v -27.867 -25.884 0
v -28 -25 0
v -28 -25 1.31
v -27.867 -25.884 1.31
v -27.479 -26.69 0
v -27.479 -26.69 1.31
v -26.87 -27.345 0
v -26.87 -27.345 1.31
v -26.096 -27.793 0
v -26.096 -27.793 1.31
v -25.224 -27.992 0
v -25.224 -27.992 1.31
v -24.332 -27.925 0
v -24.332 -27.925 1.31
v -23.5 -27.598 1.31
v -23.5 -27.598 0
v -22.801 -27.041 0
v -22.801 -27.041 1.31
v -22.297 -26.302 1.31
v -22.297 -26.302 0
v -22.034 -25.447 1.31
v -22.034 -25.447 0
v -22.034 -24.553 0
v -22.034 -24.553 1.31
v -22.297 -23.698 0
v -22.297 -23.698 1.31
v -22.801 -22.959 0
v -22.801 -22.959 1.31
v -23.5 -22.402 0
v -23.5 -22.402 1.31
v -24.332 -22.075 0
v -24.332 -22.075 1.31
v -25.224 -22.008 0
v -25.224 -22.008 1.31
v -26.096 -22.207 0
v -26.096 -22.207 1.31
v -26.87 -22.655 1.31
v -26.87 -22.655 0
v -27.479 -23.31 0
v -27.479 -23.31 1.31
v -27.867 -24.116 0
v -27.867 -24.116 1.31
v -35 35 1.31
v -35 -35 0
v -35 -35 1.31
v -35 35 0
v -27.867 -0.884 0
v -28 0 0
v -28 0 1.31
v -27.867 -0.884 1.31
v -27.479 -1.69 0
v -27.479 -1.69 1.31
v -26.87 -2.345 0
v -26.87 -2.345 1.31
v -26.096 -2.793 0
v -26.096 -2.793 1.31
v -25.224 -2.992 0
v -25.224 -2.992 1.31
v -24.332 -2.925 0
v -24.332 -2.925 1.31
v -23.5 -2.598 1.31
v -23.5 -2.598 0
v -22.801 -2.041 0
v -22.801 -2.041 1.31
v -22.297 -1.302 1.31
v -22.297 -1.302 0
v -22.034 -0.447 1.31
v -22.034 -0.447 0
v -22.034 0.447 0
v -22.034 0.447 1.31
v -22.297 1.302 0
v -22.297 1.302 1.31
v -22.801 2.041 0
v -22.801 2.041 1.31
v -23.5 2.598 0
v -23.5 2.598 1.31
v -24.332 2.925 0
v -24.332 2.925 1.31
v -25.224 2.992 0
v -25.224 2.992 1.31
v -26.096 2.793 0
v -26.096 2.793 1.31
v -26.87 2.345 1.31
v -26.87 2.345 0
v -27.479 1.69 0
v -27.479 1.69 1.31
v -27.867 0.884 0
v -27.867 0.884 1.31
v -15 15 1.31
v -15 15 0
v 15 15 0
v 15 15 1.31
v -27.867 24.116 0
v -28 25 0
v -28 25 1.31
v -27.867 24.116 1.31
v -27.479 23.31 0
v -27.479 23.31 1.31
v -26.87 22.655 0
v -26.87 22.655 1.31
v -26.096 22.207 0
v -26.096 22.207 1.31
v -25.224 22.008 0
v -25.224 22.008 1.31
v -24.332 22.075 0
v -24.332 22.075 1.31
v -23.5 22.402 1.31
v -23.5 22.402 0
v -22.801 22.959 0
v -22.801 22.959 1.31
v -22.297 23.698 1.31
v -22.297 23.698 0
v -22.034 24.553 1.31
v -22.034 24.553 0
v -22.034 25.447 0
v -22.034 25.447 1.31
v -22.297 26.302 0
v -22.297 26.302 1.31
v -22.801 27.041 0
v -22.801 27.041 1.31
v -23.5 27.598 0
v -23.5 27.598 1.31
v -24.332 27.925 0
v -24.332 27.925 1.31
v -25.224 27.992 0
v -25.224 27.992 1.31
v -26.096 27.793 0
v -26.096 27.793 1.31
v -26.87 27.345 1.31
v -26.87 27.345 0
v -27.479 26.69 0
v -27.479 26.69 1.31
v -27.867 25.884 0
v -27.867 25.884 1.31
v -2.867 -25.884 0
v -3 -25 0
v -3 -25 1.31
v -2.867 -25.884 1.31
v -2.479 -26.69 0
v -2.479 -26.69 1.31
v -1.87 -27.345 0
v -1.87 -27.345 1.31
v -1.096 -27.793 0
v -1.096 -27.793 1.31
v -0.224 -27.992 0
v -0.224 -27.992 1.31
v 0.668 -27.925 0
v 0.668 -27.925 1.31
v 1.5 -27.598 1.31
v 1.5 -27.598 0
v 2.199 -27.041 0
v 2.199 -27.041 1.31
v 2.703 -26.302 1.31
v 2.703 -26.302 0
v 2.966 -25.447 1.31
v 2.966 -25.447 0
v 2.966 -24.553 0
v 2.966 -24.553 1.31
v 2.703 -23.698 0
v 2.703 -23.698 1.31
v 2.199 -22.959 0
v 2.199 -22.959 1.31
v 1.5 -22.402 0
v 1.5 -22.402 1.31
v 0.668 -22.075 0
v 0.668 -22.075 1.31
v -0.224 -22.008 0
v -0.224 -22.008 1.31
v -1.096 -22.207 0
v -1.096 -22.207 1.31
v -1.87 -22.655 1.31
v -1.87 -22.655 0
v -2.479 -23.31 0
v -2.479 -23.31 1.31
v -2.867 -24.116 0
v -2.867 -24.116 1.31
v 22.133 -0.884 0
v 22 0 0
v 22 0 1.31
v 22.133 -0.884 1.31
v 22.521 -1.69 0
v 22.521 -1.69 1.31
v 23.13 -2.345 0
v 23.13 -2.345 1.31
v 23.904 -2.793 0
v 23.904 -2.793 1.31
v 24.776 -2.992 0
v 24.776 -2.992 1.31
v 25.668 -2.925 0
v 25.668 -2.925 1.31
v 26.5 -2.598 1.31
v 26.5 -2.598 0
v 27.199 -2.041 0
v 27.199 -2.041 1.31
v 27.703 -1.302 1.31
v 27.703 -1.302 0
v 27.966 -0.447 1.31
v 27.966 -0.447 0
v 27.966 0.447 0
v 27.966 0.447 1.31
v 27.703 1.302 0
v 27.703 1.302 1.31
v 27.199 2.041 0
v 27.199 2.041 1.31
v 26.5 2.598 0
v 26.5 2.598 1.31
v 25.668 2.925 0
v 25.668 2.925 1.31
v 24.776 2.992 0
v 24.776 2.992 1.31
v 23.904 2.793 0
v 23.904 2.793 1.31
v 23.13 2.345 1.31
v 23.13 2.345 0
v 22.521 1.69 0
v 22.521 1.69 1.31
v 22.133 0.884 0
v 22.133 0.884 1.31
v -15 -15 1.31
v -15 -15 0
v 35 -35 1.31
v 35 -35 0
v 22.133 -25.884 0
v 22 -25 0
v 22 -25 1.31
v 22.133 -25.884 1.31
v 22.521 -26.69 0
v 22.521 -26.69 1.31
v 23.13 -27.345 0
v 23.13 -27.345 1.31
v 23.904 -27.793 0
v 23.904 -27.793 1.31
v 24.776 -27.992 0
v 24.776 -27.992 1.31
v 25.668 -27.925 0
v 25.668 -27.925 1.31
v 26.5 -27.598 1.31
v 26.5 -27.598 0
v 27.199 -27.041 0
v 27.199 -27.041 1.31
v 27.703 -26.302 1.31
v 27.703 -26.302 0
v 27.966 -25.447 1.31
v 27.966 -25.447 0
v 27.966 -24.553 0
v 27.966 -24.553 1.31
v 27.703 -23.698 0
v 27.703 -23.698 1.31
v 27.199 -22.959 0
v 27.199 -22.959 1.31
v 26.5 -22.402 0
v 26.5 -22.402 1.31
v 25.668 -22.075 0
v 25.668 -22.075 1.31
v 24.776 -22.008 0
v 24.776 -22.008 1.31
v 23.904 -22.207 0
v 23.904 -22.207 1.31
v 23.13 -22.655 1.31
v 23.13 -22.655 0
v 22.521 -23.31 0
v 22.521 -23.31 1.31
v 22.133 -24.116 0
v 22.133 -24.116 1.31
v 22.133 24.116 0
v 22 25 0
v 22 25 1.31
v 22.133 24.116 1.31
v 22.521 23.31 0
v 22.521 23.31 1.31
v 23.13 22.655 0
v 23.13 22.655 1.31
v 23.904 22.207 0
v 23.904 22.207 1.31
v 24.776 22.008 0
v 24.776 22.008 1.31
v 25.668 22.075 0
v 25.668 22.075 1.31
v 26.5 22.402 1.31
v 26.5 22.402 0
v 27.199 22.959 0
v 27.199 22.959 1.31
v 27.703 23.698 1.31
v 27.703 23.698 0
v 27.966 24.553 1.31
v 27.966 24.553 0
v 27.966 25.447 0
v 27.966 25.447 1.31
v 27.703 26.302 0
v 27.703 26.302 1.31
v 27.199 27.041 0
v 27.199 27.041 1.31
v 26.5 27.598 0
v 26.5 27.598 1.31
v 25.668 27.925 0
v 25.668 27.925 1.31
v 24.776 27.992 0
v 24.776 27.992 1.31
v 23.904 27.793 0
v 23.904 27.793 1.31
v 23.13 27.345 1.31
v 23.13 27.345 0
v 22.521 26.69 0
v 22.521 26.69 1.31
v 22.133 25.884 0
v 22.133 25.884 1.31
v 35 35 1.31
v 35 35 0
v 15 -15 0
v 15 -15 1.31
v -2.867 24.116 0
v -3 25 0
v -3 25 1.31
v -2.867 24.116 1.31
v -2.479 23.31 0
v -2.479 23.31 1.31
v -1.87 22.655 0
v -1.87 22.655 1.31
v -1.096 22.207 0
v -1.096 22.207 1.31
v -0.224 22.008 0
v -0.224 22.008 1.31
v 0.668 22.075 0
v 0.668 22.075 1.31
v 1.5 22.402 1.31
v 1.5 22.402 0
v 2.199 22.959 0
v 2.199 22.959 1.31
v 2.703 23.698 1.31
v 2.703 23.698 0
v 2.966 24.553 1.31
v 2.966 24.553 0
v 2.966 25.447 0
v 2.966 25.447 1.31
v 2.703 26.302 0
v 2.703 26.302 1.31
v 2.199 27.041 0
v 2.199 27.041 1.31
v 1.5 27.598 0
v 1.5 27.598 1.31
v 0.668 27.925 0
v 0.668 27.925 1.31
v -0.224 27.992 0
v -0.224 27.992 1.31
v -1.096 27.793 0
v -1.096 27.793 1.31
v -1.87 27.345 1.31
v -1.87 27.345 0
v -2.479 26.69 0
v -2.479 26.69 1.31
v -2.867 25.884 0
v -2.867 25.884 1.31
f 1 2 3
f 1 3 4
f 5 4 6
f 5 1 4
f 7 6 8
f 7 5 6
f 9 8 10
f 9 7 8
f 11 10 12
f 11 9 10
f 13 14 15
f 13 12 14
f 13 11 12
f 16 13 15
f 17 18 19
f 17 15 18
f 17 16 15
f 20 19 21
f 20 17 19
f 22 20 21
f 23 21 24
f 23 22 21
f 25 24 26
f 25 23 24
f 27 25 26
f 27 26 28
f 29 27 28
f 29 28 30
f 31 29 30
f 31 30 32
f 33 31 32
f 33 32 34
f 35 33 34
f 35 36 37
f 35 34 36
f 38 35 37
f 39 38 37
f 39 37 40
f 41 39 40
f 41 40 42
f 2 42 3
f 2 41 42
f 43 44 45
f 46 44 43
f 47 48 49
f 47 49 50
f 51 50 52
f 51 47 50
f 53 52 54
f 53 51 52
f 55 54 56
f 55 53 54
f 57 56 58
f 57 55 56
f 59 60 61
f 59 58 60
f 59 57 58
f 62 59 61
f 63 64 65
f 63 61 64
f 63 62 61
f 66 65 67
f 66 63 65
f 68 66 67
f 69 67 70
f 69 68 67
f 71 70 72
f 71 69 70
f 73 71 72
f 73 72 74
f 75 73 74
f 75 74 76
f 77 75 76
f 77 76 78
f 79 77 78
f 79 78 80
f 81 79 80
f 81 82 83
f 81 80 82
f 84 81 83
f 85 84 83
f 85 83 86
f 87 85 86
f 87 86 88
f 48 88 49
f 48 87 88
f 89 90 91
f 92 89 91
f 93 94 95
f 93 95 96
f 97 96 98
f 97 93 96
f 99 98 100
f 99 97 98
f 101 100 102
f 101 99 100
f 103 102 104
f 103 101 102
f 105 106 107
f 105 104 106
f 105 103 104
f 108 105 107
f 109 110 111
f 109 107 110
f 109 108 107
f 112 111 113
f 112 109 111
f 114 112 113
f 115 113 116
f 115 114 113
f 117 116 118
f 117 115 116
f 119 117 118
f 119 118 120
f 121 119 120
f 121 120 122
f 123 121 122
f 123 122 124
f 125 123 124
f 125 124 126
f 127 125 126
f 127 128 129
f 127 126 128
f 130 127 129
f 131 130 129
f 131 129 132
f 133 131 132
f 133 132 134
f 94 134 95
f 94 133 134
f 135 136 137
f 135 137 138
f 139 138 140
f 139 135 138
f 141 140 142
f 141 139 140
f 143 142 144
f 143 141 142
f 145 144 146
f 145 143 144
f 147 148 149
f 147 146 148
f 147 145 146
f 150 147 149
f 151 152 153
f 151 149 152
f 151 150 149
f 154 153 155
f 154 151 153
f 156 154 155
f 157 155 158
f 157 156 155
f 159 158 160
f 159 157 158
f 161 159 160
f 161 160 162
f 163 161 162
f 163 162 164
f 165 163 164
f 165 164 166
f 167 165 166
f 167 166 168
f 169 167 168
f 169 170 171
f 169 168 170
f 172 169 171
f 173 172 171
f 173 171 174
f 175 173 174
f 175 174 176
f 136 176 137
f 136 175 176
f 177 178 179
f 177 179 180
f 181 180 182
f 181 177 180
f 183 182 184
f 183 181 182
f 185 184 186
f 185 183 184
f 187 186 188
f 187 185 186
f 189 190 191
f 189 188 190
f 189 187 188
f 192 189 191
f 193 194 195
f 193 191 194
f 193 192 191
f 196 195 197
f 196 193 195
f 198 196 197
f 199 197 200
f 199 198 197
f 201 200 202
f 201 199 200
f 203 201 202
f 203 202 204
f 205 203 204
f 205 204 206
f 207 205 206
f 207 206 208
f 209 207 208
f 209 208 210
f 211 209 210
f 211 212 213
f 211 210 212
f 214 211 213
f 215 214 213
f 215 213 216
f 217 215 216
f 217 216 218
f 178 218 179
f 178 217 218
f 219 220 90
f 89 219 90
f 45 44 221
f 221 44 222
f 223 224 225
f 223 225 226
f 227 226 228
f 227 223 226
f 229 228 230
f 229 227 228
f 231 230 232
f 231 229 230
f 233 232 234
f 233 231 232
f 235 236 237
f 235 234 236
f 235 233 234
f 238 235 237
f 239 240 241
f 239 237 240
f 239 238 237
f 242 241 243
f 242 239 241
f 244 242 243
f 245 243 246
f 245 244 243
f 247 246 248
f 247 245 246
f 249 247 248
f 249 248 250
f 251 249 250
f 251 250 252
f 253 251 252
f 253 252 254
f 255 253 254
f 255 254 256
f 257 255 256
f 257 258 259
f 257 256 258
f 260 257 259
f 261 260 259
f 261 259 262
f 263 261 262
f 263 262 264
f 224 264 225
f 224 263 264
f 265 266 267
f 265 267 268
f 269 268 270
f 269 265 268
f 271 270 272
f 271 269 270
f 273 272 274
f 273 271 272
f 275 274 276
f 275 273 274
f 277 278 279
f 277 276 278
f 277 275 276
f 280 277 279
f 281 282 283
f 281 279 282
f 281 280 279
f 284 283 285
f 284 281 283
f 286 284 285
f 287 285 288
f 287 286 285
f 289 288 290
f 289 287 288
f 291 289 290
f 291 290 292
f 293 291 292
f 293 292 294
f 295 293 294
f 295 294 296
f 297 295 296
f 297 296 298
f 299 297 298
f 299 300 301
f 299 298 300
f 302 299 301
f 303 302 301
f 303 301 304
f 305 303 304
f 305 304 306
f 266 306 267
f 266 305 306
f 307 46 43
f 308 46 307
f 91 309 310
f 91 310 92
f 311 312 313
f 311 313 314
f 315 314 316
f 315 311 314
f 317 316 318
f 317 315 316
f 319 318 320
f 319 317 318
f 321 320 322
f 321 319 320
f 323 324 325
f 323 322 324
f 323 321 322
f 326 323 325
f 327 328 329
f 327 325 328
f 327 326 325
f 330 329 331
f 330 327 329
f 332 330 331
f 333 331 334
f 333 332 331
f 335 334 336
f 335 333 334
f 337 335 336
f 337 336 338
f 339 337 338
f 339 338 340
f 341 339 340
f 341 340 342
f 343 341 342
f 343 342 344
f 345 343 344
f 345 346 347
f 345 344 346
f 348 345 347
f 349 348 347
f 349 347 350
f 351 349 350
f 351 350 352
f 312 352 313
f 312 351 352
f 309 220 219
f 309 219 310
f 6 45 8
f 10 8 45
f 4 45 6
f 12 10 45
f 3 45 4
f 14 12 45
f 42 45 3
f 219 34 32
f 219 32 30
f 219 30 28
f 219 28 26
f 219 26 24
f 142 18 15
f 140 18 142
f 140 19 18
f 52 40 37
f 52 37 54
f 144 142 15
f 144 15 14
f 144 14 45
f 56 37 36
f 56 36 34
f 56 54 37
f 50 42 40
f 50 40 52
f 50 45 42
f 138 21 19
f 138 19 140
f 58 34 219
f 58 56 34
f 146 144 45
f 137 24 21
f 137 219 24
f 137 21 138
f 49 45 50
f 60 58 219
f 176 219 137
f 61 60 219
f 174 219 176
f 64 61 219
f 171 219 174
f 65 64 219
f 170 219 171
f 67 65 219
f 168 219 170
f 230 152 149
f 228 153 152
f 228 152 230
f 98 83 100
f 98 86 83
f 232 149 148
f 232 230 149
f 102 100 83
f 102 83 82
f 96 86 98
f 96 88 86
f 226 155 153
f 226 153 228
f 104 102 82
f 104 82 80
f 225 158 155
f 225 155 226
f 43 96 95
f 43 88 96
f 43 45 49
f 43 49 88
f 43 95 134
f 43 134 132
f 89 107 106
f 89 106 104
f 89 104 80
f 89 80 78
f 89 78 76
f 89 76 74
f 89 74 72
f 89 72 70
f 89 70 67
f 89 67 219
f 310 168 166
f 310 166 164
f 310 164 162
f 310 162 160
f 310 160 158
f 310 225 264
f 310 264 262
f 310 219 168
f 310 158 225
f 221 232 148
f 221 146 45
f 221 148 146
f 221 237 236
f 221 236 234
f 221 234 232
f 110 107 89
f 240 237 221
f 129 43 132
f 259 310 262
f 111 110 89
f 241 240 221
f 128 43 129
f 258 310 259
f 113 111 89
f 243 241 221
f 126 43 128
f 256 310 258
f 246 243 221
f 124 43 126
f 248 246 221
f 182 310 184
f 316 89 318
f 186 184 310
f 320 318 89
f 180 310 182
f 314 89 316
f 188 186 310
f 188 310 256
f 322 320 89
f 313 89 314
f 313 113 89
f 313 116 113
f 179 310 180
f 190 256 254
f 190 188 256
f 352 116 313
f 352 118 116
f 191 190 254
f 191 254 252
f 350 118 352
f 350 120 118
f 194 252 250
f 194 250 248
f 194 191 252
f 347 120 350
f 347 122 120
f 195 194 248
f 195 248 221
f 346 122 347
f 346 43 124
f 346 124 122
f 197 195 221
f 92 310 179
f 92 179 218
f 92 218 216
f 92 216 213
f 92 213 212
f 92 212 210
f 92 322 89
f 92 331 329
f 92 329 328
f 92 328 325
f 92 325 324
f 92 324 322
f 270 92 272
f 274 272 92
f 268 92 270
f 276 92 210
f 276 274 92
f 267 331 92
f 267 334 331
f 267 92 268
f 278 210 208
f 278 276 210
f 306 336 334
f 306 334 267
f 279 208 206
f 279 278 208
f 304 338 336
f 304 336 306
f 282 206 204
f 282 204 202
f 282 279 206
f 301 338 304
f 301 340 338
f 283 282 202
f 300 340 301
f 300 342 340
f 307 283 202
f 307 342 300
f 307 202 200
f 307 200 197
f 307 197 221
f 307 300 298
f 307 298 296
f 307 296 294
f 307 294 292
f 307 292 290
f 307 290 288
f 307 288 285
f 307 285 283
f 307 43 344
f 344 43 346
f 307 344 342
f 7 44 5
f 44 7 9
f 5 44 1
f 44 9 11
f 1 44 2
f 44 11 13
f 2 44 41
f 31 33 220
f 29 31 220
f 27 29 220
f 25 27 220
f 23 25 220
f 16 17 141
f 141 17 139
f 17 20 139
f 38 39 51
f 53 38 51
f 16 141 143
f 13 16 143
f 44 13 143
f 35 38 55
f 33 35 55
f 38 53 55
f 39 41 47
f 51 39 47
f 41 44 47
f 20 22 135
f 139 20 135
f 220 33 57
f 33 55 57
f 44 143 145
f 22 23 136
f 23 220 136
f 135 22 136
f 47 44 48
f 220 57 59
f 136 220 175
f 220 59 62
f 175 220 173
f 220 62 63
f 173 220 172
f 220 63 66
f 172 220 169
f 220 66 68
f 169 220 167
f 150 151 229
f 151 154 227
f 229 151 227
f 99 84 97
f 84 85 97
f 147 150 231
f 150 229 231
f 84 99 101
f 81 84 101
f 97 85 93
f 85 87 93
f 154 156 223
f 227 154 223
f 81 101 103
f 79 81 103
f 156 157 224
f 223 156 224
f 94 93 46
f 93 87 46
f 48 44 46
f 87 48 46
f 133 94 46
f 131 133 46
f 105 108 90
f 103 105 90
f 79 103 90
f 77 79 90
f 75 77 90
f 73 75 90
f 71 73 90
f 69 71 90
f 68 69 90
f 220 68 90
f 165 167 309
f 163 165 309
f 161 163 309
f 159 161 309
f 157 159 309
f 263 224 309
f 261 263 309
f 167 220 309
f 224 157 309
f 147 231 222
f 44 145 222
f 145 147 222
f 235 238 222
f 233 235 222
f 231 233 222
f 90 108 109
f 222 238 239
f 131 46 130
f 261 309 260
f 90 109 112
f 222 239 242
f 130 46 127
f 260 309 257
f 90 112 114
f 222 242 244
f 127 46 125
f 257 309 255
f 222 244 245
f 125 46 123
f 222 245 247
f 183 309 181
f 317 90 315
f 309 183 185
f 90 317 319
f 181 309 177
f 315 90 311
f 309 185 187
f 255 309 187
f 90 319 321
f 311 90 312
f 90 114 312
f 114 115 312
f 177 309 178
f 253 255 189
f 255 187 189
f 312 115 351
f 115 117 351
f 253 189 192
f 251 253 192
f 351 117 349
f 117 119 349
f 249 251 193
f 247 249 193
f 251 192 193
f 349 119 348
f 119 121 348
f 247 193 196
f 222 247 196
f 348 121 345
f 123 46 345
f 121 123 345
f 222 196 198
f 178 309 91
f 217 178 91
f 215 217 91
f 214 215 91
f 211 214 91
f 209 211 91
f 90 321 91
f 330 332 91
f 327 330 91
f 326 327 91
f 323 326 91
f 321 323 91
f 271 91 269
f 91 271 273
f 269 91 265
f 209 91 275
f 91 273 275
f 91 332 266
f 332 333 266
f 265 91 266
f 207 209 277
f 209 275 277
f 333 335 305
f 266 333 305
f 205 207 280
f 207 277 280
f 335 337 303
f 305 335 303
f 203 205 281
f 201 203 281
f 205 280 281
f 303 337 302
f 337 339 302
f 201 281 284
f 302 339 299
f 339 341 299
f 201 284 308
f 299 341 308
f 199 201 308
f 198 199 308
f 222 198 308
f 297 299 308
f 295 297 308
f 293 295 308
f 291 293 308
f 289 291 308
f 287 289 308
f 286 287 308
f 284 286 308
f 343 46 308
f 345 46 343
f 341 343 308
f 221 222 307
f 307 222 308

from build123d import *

# Parameters (mm, degrees)
SKETCH3_W               = 70
SKETCH3_H               = 70
BOSS_EXTRUDE2_DEPTH     = 1.31
CUT_EXTRUDE1_DEPTH      = 3.08
CUT_EXTRUDE1_DEPTH_BACK = 31
SKETCH4_R               = 3
SKETCH4_W               = 30
SKETCH4_H               = 30


with BuildPart() as part:
    # Sketch3 → Boss-Extrude2 (new body)
    with BuildSketch(Plane.XY):
        Rectangle(SKETCH3_W, SKETCH3_H)
    extrude(amount=BOSS_EXTRUDE2_DEPTH)

    # Sketch4 → Cut-Extrude1 (cut, two sides: drawn at the far end of the back side and taken through both)
    with BuildSketch(Plane.XY.offset(1.31).offset(-CUT_EXTRUDE1_DEPTH_BACK)):
        with Locations(Location((-25, 25, 0), (0, 0, 180))):
            Circle(SKETCH4_R)
        with Locations(Location((0, 25, 0), (0, 0, 180))):
            Circle(SKETCH4_R)
        with Locations(Location((25, 25, 0), (0, 0, 180))):
            Circle(SKETCH4_R)
        with Locations(Location((25, 0, 0), (0, 0, 180))):
            Circle(SKETCH4_R)
        with Locations(Location((25, -25, 0), (0, 0, 180))):
            Circle(SKETCH4_R)
        with Locations(Location((0, -25, 0), (0, 0, 180))):
            Circle(SKETCH4_R)
        with Locations(Location((-25, -25, 0), (0, 0, 180))):
            Circle(SKETCH4_R)
        with Locations(Location((-25, 0, 0), (0, 0, 180))):
            Circle(SKETCH4_R)
        Rectangle(SKETCH4_W, SKETCH4_H)
    extrude(amount=CUT_EXTRUDE1_DEPTH + CUT_EXTRUDE1_DEPTH_BACK, mode=Mode.SUBTRACT)


solid = part.part
